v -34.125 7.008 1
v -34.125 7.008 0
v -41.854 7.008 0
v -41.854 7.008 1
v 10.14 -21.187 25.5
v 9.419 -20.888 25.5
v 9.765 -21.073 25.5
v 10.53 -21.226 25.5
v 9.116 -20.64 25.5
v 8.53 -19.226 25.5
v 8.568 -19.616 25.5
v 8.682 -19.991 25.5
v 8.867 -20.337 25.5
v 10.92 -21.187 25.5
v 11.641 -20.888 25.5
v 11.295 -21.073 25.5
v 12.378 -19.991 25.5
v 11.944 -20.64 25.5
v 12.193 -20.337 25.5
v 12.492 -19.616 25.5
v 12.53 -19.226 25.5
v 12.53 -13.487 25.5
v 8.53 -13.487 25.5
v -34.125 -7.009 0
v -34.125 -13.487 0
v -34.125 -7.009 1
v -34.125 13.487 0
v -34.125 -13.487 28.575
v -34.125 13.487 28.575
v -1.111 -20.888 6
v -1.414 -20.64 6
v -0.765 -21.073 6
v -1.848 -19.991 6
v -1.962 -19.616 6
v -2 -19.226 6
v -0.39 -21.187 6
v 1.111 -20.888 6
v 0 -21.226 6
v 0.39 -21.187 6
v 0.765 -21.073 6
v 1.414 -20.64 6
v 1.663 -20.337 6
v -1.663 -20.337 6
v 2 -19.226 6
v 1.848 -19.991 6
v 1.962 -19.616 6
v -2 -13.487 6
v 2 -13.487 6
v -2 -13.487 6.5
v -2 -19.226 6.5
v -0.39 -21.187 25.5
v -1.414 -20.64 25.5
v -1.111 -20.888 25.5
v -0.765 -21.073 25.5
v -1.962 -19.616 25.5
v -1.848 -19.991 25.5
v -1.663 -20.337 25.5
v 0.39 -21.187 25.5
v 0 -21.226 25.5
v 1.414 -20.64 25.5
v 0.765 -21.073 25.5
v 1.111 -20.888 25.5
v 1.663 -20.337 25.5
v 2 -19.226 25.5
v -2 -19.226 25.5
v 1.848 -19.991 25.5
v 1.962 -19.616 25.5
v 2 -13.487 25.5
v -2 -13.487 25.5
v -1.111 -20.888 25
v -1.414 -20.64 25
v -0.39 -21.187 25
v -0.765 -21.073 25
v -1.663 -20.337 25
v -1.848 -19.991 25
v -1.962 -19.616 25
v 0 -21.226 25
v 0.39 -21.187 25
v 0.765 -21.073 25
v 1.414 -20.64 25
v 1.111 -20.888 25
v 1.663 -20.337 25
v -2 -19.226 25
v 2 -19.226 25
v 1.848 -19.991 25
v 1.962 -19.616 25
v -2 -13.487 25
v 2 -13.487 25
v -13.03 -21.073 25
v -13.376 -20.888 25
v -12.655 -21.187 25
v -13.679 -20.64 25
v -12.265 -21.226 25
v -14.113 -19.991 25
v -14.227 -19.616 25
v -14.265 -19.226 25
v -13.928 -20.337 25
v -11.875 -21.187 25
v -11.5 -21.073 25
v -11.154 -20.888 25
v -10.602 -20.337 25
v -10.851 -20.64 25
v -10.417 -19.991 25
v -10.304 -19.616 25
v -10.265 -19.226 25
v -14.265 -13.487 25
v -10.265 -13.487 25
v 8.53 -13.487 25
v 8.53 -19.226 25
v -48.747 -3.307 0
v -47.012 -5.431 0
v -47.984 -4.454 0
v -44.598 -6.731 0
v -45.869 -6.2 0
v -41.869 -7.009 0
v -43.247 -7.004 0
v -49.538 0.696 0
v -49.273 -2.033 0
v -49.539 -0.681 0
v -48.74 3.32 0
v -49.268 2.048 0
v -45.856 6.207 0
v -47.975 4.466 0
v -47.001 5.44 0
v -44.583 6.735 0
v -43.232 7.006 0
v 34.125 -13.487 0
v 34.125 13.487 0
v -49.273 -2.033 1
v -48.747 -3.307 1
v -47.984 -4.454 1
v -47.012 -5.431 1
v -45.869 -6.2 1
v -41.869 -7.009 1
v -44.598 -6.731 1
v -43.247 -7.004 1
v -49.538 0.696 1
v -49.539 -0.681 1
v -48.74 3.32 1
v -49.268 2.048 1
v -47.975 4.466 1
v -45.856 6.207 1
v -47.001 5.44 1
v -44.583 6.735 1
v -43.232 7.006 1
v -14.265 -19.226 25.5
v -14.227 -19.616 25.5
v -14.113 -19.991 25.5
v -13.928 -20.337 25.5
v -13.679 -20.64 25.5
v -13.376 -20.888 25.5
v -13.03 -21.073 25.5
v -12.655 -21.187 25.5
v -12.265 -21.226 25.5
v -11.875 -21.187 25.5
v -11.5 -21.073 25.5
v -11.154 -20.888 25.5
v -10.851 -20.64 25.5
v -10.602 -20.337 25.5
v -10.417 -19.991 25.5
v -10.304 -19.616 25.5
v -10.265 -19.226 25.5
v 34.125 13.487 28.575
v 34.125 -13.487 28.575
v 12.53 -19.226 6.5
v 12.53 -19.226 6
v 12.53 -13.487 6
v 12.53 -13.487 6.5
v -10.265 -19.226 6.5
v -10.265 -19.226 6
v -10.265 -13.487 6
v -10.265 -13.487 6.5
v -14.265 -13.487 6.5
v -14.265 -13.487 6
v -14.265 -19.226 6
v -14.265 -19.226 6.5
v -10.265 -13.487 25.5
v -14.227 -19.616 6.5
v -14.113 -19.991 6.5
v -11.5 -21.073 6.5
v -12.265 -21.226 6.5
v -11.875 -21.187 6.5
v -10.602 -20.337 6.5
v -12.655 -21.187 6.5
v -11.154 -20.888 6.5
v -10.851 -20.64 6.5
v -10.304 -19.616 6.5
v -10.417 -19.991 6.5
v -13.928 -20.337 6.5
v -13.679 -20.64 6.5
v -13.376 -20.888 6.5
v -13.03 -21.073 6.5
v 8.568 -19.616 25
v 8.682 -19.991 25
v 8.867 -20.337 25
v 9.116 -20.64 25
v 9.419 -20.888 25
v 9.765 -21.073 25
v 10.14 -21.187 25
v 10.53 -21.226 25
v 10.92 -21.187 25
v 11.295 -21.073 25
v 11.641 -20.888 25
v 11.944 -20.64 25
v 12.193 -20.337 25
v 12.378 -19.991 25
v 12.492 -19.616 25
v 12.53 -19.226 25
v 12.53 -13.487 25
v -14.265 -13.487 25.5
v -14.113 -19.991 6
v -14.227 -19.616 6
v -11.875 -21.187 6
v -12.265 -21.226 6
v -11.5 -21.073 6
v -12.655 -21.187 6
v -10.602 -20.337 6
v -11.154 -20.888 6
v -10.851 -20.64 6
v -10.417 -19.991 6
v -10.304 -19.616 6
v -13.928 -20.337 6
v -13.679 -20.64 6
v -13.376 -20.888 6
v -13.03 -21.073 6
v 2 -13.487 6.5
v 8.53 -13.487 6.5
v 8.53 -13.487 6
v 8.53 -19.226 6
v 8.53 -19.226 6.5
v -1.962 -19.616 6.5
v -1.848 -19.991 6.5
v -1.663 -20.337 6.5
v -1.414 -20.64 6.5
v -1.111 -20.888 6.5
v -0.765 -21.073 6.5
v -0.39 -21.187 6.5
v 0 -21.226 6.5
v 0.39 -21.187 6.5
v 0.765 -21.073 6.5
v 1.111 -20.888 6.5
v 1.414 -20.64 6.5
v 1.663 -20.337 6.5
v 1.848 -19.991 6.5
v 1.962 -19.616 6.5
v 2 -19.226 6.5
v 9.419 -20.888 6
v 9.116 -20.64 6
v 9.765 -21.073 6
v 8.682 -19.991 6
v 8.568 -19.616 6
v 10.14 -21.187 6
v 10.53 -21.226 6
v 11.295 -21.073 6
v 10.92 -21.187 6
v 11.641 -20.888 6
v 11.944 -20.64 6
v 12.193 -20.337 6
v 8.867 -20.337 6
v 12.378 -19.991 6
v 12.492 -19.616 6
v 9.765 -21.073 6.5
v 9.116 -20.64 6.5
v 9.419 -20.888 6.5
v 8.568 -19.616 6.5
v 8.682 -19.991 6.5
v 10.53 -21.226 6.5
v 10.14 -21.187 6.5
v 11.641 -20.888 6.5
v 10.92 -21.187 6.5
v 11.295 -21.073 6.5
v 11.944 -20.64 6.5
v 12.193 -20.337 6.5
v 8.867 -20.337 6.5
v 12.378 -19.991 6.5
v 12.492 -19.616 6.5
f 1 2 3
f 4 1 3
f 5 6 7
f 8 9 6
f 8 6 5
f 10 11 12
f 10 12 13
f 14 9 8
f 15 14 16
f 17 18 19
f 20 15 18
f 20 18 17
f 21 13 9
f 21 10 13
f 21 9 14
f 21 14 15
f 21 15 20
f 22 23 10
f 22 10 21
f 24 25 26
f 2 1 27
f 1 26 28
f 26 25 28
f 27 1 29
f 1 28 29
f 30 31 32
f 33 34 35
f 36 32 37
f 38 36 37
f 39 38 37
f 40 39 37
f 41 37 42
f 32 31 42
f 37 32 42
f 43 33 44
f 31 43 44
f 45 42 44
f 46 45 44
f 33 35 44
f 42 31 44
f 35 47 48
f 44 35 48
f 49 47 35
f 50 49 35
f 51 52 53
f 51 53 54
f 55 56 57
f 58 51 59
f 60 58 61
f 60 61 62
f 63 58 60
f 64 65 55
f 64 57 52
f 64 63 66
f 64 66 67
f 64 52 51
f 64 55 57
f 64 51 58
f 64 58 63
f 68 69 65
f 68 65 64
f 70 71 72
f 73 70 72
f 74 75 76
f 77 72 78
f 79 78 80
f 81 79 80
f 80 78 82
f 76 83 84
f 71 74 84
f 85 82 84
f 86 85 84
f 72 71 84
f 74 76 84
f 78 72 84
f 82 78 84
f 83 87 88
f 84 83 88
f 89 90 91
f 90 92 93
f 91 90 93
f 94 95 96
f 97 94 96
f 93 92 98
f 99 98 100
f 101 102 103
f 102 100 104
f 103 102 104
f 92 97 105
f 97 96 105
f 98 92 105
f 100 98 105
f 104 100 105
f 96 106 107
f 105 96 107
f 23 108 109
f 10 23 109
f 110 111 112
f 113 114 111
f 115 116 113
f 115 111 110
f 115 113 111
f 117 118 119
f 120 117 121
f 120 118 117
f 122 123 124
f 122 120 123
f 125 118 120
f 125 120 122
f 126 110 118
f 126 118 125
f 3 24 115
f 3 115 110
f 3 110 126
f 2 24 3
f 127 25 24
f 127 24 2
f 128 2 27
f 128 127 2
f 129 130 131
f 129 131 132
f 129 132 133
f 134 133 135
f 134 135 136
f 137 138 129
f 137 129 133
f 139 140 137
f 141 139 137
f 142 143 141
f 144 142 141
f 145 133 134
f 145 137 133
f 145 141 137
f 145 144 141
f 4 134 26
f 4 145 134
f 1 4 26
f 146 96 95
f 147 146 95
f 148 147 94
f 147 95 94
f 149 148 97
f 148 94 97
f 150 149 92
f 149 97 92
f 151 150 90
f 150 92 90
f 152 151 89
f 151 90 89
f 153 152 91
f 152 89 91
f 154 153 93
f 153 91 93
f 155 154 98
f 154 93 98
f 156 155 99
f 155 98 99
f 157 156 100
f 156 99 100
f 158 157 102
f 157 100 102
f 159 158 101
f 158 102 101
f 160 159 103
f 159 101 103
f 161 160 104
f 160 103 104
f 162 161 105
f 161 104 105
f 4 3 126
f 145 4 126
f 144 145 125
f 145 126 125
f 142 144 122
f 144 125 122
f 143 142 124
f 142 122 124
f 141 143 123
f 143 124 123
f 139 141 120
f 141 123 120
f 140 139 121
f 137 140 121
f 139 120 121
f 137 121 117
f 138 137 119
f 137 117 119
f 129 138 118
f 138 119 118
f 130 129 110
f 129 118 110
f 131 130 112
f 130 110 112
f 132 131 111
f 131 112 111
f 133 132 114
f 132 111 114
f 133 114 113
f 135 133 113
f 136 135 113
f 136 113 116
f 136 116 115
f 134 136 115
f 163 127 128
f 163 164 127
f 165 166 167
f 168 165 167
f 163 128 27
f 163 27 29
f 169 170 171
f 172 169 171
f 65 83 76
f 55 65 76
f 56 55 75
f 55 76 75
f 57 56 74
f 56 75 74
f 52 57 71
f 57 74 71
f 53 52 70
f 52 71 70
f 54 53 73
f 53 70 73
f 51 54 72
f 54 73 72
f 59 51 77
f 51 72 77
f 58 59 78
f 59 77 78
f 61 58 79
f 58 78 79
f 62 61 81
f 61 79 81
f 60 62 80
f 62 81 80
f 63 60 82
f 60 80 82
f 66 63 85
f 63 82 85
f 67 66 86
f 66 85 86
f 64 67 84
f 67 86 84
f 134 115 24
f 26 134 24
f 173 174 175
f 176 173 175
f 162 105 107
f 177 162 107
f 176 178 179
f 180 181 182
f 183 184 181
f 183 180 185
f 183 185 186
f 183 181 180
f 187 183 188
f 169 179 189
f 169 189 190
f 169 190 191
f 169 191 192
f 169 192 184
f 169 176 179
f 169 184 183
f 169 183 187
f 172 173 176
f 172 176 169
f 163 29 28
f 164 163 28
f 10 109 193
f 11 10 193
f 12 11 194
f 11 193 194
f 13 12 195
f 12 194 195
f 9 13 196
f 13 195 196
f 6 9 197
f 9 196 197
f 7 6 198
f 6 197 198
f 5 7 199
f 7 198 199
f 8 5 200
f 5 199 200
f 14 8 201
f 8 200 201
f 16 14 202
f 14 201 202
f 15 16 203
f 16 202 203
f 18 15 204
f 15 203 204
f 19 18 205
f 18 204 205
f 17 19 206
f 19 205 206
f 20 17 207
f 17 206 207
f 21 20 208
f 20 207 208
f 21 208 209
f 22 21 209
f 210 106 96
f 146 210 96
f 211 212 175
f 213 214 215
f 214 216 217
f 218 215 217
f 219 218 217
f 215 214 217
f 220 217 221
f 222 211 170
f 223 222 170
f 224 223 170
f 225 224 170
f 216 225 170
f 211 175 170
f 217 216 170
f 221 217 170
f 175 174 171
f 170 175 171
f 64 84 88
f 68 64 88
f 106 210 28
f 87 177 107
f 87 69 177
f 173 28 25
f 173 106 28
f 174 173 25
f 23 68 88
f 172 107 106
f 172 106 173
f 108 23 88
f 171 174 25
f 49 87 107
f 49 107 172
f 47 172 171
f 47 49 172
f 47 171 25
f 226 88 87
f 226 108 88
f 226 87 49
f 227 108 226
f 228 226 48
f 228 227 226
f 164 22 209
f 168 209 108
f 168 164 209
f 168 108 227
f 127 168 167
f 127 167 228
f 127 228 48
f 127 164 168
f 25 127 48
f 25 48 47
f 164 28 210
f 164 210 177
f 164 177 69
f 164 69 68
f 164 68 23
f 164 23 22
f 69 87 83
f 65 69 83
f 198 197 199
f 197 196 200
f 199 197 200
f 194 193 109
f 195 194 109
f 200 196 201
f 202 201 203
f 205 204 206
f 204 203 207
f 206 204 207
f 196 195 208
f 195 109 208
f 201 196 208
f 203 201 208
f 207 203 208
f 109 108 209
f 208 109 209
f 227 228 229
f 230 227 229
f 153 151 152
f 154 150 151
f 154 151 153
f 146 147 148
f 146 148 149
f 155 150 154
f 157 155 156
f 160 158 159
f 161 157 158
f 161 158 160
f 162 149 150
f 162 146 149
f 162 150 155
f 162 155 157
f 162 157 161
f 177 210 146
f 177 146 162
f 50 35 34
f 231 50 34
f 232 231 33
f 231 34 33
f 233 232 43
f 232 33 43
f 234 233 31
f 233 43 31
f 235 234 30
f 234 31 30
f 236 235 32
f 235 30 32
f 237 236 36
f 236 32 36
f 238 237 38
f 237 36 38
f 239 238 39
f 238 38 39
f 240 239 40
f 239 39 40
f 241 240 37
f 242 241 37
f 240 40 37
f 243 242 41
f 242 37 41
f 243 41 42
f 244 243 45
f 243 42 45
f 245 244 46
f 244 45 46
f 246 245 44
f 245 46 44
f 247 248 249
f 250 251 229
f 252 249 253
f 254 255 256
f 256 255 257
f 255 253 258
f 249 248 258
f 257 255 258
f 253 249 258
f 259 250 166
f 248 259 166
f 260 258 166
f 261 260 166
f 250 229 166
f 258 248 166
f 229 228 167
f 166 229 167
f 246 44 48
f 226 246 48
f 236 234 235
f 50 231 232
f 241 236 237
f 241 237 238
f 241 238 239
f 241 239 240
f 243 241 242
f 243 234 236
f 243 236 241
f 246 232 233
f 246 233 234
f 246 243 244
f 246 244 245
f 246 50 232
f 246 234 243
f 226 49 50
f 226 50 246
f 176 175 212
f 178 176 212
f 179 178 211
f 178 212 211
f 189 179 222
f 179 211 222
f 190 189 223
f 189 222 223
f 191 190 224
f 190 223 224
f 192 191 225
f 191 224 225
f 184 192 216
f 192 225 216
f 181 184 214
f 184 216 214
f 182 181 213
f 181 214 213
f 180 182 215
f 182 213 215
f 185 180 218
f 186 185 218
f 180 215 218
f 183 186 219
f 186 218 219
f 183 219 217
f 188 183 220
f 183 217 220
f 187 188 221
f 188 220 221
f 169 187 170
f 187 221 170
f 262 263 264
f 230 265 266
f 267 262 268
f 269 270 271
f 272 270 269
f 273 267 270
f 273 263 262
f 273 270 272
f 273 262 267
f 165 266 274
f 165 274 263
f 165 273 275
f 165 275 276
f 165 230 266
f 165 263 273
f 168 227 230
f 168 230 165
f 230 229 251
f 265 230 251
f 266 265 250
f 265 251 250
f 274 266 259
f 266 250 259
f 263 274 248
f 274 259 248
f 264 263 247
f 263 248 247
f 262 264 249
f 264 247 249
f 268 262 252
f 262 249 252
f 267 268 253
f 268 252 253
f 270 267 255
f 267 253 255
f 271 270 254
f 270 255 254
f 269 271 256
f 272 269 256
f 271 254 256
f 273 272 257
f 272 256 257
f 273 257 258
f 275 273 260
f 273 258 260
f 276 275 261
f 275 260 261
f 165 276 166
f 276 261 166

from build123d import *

# Parameters (mm, degrees)
F1_DEPTH = 34.1249
F5_DEPTH = 0.5
F7_DEPTH = 0.5
F9_DEPTH = 1


with BuildPart() as f1:
    # F0 (on Right) → F1 (new body, symmetric)
    with BuildSketch(Plane.YZ):
        Polygon((-13.4874, 0), (0, 0), (13.4874, 0), (13.4874, 28.575), (0, 28.575), (-13.4874, 28.575), align=None)
    extrude(amount=F1_DEPTH, both=True)

    # F4 (on offset) → F5 (join)
    with BuildSketch(Plane.XY.offset(6)):
        with BuildLine():
            ThreePointArc((-2, -19.22551), (0, -21.22551), (2, -19.22551))
            ThreePointArc((2, -19.22551), (0, -17.22551), (-2, -19.22551))
        make_face()
        with BuildLine():
            ThreePointArc((-2, -19.22551), (0, -17.22551), (2, -19.22551))
            Line((2, -19.22551), (2, 0))
            Line((2, 0), (-2, 0))
            Line((-2, 0), (-2, -19.22551))
        make_face()
        with BuildLine():
            ThreePointArc((-14.265118, -19.22551), (-12.265118, -21.22551), (-10.265118, -19.22551))
            ThreePointArc((-10.265118, -19.22551), (-12.265118, -17.22551), (-14.265118, -19.22551))
        make_face()
        with BuildLine():
            ThreePointArc((-14.265118, -19.22551), (-12.265118, -17.22551), (-10.265118, -19.22551))
            Line((-10.265118, -19.22551), (-10.265118, 0))
            Line((-10.265118, 0), (-14.265118, 0))
            Line((-14.265118, 0), (-14.265118, -19.22551))
        make_face()
        with BuildLine():
            ThreePointArc((8.530043, -19.22551), (10.530043, -21.22551), (12.530043, -19.22551))
            ThreePointArc((12.530043, -19.22551), (10.530043, -17.22551), (8.530043, -19.22551))
        make_face()
        with BuildLine():
            ThreePointArc((8.530043, -19.22551), (10.530043, -17.22551), (12.530043, -19.22551))
            Line((12.530043, -19.22551), (12.530043, 0))
            Line((12.530043, 0), (8.530043, 0))
            Line((8.530043, 0), (8.530043, -19.22551))
        make_face()
    extrude(amount=F5_DEPTH)

    # F6 (on offset) → F7 (join)
    with BuildSketch(Plane.XY.offset(25)):
        with BuildLine():
            ThreePointArc((8.530043, -19.22551), (10.530043, -21.22551), (12.530043, -19.22551))
            Line((12.530043, -19.22551), (12.530043, -13.4874))
            Line((12.530043, -13.4874), (8.530043, -13.4874))
            Line((8.530043, -13.4874), (8.530043, -19.22551))
        make_face()
        with BuildLine():
            ThreePointArc((-2, -19.22551), (0, -21.22551), (2, -19.22551))
            Line((2, -19.22551), (2, -13.4874))
            Line((2, -13.4874), (-2, -13.4874))
            Line((-2, -13.4874), (-2, -19.22551))
        make_face()
        with BuildLine():
            ThreePointArc((-14.265118, -19.22551), (-12.265118, -21.22551), (-10.265118, -19.22551))
            Line((-10.265118, -19.22551), (-10.265118, -13.4874))
            Line((-10.265118, -13.4874), (-14.265118, -13.4874))
            Line((-14.265118, -13.4874), (-14.265118, -19.22551))
        make_face()
    extrude(amount=F7_DEPTH)

    # F8 (on Top) → F9 (join)
    with BuildSketch(Plane.XY):
        Polygon((-29.149349, 7.008), (-34.1249, 7.008), (-34.1249, -7.009424), (-28.291495, -7.009424), align=None)
        with BuildLine():
            Line((-34.1249, -7.009424), (-34.1249, 7.008))
            Line((-34.1249, 7.008), (-41.854384, 7.008))
            ThreePointArc((-41.854384, 7.008), (-37.319332, 4.732924), (-35.491192, 0))
            ThreePointArc((-35.491192, 0), (-37.324363, -4.738458), (-41.869275, -7.009424))
            Line((-41.869275, -7.009424), (-34.1249, -7.009424))
        make_face()
        with BuildLine():
            ThreePointArc((-35.491192, 0), (-37.319332, 4.732924), (-41.854384, 7.008))
            ThreePointArc((-41.854384, 7.008), (-49.57253, 0.007479), (-41.869275, -7.009424))
            ThreePointArc((-41.869275, -7.009424), (-37.324363, -4.738458), (-35.491192, 0))
        make_face()
    extrude(amount=F9_DEPTH)


solid = f1.part
